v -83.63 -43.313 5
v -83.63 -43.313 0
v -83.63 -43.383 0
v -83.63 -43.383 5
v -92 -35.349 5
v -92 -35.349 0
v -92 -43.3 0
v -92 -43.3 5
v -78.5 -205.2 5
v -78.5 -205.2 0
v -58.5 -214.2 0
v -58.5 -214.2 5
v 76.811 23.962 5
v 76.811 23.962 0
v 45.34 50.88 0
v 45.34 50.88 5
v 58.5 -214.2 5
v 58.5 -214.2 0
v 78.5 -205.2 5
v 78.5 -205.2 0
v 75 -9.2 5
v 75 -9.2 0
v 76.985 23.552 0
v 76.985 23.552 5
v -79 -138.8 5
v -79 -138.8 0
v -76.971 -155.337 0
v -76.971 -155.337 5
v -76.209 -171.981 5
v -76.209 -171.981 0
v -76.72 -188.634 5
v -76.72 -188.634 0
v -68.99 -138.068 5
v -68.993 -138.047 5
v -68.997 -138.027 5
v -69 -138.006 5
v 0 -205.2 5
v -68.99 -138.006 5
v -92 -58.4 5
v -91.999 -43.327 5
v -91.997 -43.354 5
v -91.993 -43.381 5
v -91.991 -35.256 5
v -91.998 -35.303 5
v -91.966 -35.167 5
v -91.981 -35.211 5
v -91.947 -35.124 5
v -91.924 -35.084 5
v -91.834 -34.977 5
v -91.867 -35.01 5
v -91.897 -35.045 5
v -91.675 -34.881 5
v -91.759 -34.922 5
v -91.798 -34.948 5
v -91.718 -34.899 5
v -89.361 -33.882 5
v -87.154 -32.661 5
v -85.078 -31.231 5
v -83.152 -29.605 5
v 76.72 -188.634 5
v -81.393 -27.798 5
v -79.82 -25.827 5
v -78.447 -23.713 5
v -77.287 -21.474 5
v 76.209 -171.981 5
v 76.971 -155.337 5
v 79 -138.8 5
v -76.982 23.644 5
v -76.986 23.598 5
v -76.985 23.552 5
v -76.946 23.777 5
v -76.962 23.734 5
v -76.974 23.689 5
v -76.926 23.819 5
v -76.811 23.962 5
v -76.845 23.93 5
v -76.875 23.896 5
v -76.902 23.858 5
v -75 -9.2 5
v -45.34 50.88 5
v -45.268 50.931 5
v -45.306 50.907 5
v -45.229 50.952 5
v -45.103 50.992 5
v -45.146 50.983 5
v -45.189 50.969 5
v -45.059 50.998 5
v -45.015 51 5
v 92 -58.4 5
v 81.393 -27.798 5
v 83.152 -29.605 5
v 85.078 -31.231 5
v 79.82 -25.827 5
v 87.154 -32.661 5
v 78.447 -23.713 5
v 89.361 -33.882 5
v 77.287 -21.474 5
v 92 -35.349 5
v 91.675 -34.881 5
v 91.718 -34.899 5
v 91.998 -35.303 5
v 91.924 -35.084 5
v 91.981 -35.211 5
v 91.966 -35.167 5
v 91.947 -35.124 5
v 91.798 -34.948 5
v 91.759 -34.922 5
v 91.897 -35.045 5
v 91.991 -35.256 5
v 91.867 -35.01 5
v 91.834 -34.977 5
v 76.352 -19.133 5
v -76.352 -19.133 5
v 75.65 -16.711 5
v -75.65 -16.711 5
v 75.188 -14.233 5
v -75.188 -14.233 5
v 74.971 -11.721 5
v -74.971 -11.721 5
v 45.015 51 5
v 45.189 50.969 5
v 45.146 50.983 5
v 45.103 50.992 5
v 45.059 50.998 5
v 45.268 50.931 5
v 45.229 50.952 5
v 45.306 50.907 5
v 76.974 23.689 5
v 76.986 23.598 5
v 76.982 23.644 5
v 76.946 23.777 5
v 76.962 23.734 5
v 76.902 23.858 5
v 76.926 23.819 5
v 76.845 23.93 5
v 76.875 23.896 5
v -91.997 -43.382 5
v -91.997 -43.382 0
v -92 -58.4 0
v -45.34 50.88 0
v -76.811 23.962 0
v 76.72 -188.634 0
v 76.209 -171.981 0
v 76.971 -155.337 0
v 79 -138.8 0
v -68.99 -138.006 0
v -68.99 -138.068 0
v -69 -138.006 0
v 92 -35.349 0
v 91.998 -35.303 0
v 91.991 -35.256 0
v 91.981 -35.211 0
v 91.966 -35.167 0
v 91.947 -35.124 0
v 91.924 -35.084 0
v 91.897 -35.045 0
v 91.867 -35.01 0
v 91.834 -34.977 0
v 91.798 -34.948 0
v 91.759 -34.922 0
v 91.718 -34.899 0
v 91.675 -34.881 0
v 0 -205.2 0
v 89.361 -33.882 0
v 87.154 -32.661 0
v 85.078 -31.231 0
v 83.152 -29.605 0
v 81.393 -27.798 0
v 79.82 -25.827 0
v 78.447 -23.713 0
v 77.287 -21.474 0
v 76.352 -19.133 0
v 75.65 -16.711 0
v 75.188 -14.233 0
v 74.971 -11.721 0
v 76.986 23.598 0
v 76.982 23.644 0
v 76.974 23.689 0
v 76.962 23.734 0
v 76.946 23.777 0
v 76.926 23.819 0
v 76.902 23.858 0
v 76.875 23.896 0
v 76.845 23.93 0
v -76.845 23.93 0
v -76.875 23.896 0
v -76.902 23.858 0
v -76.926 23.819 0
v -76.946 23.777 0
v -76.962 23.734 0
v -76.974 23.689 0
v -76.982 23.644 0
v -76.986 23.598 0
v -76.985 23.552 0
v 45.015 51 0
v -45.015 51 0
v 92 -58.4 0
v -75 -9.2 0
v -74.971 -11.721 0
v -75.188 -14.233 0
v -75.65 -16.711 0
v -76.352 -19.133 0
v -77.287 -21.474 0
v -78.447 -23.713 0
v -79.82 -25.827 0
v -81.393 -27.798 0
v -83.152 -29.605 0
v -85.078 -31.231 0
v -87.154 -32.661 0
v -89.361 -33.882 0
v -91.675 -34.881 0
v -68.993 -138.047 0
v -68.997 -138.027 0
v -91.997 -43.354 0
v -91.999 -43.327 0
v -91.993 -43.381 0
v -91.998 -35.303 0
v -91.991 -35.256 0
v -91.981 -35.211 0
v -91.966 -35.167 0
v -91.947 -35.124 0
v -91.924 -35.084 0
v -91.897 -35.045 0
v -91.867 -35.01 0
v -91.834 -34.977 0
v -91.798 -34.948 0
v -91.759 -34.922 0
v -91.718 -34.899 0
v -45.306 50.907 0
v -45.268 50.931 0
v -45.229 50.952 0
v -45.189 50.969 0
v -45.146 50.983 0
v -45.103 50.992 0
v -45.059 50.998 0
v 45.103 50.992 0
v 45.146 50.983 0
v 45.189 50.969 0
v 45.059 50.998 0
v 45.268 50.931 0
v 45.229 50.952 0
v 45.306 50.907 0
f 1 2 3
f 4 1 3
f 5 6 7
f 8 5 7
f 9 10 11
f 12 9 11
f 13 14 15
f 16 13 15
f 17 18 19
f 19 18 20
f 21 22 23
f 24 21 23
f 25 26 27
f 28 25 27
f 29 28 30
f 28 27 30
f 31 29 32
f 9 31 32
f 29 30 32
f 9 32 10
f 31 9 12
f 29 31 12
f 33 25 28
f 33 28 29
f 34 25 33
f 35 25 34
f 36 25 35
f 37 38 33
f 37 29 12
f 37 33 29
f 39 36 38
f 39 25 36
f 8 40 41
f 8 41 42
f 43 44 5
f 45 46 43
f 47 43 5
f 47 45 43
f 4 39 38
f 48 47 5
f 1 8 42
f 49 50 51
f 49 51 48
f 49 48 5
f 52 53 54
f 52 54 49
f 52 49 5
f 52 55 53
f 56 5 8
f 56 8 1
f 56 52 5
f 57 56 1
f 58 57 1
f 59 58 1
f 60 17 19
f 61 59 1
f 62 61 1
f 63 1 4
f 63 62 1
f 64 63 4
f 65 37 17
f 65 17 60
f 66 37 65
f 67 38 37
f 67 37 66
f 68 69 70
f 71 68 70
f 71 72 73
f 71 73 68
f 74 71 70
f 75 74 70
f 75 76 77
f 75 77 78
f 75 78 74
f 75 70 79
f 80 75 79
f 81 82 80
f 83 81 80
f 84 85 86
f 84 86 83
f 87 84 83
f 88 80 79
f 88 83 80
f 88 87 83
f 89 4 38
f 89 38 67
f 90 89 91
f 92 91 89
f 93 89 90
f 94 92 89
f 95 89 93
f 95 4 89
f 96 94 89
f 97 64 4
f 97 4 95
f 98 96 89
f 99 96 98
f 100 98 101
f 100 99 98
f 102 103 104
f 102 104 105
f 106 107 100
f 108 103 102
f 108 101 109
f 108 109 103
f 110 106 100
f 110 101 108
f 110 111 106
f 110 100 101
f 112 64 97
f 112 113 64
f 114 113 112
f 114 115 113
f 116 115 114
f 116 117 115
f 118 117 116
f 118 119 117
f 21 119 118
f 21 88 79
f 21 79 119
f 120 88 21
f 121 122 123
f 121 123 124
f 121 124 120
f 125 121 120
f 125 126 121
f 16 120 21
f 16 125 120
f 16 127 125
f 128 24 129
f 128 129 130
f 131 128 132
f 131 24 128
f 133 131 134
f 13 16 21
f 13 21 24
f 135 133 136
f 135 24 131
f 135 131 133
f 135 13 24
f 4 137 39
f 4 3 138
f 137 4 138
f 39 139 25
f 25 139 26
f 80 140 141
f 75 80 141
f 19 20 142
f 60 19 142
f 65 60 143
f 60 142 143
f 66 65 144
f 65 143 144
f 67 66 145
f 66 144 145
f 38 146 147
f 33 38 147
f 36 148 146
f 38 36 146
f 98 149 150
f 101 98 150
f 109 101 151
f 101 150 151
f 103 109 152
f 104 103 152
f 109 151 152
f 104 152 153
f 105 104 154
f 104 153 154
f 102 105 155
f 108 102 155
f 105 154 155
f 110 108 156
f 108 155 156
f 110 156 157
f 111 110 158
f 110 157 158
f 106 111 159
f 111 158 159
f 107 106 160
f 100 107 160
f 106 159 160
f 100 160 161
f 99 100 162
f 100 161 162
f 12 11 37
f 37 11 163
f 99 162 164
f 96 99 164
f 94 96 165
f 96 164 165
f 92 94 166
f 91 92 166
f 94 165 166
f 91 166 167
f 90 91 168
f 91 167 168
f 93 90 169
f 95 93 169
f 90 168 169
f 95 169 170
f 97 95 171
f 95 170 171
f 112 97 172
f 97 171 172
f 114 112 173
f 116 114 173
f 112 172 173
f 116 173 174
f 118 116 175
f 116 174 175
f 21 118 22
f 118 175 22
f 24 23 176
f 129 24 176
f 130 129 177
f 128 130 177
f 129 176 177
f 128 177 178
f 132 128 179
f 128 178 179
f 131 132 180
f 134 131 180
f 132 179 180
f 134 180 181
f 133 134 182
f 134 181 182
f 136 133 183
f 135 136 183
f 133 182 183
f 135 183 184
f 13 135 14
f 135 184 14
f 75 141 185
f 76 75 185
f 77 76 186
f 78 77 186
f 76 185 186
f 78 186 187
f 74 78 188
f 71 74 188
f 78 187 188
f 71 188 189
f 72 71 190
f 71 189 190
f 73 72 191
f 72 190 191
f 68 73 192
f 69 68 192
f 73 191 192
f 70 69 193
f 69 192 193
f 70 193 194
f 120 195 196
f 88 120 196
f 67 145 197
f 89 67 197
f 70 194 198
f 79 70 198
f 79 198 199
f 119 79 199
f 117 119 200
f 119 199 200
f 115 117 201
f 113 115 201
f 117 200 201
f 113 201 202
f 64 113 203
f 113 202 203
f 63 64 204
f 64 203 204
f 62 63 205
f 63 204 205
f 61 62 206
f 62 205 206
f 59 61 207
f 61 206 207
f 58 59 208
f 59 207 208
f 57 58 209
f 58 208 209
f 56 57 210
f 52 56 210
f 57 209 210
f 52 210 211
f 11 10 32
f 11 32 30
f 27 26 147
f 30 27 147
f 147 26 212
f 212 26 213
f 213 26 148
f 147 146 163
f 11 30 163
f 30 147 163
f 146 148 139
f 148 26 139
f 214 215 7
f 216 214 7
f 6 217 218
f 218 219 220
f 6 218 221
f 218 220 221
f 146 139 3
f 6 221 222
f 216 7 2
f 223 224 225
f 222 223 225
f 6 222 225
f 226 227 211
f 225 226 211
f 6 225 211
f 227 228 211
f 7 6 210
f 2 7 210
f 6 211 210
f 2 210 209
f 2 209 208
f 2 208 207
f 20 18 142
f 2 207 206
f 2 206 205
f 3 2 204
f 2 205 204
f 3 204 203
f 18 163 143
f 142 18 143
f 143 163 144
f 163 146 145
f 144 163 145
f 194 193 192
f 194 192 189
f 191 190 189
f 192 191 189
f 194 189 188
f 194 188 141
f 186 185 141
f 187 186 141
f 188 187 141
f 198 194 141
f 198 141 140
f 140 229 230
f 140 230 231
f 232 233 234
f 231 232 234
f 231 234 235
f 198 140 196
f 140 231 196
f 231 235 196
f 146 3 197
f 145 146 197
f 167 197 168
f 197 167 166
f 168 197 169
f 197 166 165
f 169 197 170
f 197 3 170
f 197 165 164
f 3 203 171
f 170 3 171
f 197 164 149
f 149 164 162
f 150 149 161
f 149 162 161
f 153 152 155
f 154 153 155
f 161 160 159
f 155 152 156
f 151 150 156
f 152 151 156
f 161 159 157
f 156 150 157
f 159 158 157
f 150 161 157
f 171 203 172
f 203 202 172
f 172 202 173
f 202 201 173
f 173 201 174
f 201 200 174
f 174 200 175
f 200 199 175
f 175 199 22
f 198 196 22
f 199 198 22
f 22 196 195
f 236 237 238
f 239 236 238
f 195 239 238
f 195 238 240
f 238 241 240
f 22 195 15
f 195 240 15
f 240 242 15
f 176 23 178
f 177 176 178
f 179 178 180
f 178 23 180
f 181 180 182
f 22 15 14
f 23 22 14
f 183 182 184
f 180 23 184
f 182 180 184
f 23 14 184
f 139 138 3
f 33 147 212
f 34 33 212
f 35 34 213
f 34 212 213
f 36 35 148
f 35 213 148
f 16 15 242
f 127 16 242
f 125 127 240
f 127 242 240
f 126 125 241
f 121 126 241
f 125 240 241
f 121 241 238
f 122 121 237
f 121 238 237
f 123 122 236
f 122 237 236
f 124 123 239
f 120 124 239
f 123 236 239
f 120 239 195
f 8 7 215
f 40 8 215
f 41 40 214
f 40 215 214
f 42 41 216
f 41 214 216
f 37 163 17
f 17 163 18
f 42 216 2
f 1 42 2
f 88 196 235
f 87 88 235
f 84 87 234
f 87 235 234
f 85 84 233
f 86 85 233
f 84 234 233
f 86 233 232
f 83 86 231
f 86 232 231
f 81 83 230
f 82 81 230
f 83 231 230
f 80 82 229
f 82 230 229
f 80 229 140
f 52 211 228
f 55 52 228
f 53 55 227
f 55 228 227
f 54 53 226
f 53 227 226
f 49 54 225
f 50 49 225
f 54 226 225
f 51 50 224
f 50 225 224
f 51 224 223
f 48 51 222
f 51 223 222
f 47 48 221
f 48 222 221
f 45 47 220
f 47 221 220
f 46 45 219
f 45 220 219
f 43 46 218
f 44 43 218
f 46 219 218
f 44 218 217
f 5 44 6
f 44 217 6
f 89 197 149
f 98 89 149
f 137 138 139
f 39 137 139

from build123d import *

# Parameters (mm, degrees)
EXTRUDE_1_DEPTH   = 5
EXTRUDE_1_2_DEPTH = 5


# Read off the part's stored shape, not the designer's step: 拉伸-薄壁1
with BuildPart() as part:
    # Extrude 1 outline → Extrude 1 (new body)
    with BuildSketch(Plane.XY):
        with BuildLine():
            ThreePointArc((-91.999999998, -43.29999887), (-91.998341789, -43.340687344), (-91.993377975, -43.381105931))
            Line((-91.993377975, -43.381105931), (-81.999999998, -43.29999887))
            Line((-81.999999998, -43.29999887), (-81.999999998, -41.231306411))
            ThreePointArc((-81.999999998, -41.231306411), (-68.990237418, -27.264516088), (-65.018315032, -8.595049387))
            Line((-65.018315032, -8.595049387), (-66.717183167, 19.436274835))
            Line((-66.717183167, 19.436274835), (-41.506651541, 41))
            Line((-41.506651541, 41), (41.506651544, 41))
            Line((41.506651544, 41), (66.717183171, 19.436274835))
            Line((66.717183171, 19.436274835), (65.018315035, -8.595049396))
            ThreePointArc((65.018315035, -8.595049396), (68.990237423, -27.264516092), (82.000000002, -41.231306411))
            Line((82.000000002, -41.231306411), (82.000000002, -57.596758434))
            Line((82.000000002, -57.596758434), (69.128212183, -137.203815401))
            ThreePointArc((69.128212183, -137.203815401), (66.269370107, -168.113208397), (67.632339208, -199.124591285))
            Line((67.632339208, -199.124591285), (57.095329321, -203.866245712))
            Line((57.095329321, -203.866245712), (2e-09, -195.082348893))
            Line((2e-09, -195.082348893), (-57.095329308, -203.86624571))
            Line((-57.095329308, -203.86624571), (-67.632339202, -199.124591258))
            ThreePointArc((-67.632339202, -199.124591258), (-66.269370105, -168.113208363), (-69.128212188, -137.20381536))
            Line((-69.128212188, -137.20381536), (-81.999822911, -57.597853653))
            Line((-81.999822911, -57.597853653), (-81.996689231, -43.383854869))
            Line((-81.996689231, -43.383854869), (-91.996688988, -43.381650225))
            Line((-91.996688988, -43.381650225), (-91.999999999, -58.4))
            Line((-91.999999999, -58.4), (-79.000000006, -138.79999996))
            ThreePointArc((-79.000000006, -138.79999996), (-76.209004677, -171.980865978), (-78.499999999, -205.199999999))
            Line((-78.499999999, -205.199999999), (-58.499999998, -214.2))
            Line((-58.499999998, -214.2), (2e-09, -205.199999999))
            Line((2e-09, -205.199999999), (58.500000002, -214.2))
            Line((58.500000002, -214.2), (78.500000007, -205.200000039))
            ThreePointArc((78.500000007, -205.200000039), (76.209004679, -171.980866018), (79.000000002, -138.799999999))
            Line((79.000000002, -138.799999999), (92.000000002, -58.4))
            Line((92.000000002, -58.4), (92.000000002, -35.349095722))
            ThreePointArc((92.000000002, -35.349095722), (91.910917667, -35.064233027), (91.675413177, -34.880875309))
            ThreePointArc((91.675413177, -34.880875309), (79.107890632, -24.786992353), (75.000000002, -9.2))
            Line((75.000000002, -9.2), (76.984943405, 23.551566159))
            ThreePointArc((76.984943405, 23.551566159), (76.946128848, 23.777138637), (76.810861071, 23.961779211))
            Line((76.810861071, 23.961779211), (45.340334501, 50.87996546))
            ThreePointArc((45.340334501, 50.87996546), (45.188562585, 50.969032371), (45.015332579, 51))
            Line((45.015332579, 51), (-45.015332561, 51))
            ThreePointArc((-45.015332561, 51), (-45.188562568, 50.969032376), (-45.340334486, 50.879965469))
            Line((-45.340334486, 50.879965469), (-76.810861028, 23.961779245))
            ThreePointArc((-76.810861028, 23.961779245), (-76.946128824, 23.777138686), (-76.984943405, 23.551566212))
            Line((-76.984943405, 23.551566212), (-74.999999999, -9.199999994))
            ThreePointArc((-74.999999999, -9.199999994), (-79.107890627, -24.786992351), (-91.675413174, -34.880875309))
            ThreePointArc((-91.675413174, -34.880875309), (-91.910917622, -35.064232967), (-91.999999998, -35.349095576))
            Line((-91.999999998, -35.349095576), (-91.999999998, -43.29999887))
        make_face()
    extrude(amount=EXTRUDE_1_DEPTH)

    # 草图7 → Extrude 1 2 (add)
    with BuildSketch(Plane.XY):
        with BuildLine():
            Line((-81.999999998, -43.29999887), (-83.629600195, -43.313224837))
            Line((-83.629600195, -43.313224837), (-83.629600195, -43.38349487))
            Line((-83.629600195, -43.38349487), (-81.996689231, -43.383854869))
            Line((-81.996689231, -43.383854869), (-81.999822911, -57.597853653))
            Line((-81.999822911, -57.597853653), (-69.128212188, -137.20381536))
            ThreePointArc((-69.128212188, -137.20381536), (-69.063707743, -137.605017492), (-68.999917919, -138.006333867))
            Line((-68.999917919, -138.006333867), (-68.990237418, -138.006333867))
            Line((-68.990237418, -138.006333867), (-68.990237418, -138.06764197))
            ThreePointArc((-68.990237418, -138.06764197), (-66.259225934, -168.550479027), (-67.632339202, -199.124591258))
            Line((-67.632339202, -199.124591258), (-57.095329308, -203.86624571))
            Line((-57.095329308, -203.86624571), (2e-09, -195.082348893))
            Line((2e-09, -195.082348893), (57.095329321, -203.866245712))
            Line((57.095329321, -203.866245712), (67.632339208, -199.124591285))
            ThreePointArc((67.632339208, -199.124591285), (66.269370107, -168.113208397), (69.128212183, -137.203815401))
            Line((69.128212183, -137.203815401), (82.000000002, -57.596758434))
            Line((82.000000002, -57.596758434), (82.000000002, -41.231306411))
            ThreePointArc((82.000000002, -41.231306411), (68.990237423, -27.264516092), (65.018315035, -8.595049396))
            Line((65.018315035, -8.595049396), (66.717183171, 19.436274835))
            Line((66.717183171, 19.436274835), (41.506651544, 41))
            Line((41.506651544, 41), (-41.506651541, 41))
            Line((-41.506651541, 41), (-66.717183167, 19.436274835))
            Line((-66.717183167, 19.436274835), (-65.018315032, -8.595049387))
            ThreePointArc((-65.018315032, -8.595049387), (-68.990237418, -27.264516088), (-81.999999998, -41.231306411))
            Line((-81.999999998, -41.231306411), (-81.999999998, -43.29999887))
        make_face()
    extrude(amount=EXTRUDE_1_2_DEPTH)


solid = part.part
